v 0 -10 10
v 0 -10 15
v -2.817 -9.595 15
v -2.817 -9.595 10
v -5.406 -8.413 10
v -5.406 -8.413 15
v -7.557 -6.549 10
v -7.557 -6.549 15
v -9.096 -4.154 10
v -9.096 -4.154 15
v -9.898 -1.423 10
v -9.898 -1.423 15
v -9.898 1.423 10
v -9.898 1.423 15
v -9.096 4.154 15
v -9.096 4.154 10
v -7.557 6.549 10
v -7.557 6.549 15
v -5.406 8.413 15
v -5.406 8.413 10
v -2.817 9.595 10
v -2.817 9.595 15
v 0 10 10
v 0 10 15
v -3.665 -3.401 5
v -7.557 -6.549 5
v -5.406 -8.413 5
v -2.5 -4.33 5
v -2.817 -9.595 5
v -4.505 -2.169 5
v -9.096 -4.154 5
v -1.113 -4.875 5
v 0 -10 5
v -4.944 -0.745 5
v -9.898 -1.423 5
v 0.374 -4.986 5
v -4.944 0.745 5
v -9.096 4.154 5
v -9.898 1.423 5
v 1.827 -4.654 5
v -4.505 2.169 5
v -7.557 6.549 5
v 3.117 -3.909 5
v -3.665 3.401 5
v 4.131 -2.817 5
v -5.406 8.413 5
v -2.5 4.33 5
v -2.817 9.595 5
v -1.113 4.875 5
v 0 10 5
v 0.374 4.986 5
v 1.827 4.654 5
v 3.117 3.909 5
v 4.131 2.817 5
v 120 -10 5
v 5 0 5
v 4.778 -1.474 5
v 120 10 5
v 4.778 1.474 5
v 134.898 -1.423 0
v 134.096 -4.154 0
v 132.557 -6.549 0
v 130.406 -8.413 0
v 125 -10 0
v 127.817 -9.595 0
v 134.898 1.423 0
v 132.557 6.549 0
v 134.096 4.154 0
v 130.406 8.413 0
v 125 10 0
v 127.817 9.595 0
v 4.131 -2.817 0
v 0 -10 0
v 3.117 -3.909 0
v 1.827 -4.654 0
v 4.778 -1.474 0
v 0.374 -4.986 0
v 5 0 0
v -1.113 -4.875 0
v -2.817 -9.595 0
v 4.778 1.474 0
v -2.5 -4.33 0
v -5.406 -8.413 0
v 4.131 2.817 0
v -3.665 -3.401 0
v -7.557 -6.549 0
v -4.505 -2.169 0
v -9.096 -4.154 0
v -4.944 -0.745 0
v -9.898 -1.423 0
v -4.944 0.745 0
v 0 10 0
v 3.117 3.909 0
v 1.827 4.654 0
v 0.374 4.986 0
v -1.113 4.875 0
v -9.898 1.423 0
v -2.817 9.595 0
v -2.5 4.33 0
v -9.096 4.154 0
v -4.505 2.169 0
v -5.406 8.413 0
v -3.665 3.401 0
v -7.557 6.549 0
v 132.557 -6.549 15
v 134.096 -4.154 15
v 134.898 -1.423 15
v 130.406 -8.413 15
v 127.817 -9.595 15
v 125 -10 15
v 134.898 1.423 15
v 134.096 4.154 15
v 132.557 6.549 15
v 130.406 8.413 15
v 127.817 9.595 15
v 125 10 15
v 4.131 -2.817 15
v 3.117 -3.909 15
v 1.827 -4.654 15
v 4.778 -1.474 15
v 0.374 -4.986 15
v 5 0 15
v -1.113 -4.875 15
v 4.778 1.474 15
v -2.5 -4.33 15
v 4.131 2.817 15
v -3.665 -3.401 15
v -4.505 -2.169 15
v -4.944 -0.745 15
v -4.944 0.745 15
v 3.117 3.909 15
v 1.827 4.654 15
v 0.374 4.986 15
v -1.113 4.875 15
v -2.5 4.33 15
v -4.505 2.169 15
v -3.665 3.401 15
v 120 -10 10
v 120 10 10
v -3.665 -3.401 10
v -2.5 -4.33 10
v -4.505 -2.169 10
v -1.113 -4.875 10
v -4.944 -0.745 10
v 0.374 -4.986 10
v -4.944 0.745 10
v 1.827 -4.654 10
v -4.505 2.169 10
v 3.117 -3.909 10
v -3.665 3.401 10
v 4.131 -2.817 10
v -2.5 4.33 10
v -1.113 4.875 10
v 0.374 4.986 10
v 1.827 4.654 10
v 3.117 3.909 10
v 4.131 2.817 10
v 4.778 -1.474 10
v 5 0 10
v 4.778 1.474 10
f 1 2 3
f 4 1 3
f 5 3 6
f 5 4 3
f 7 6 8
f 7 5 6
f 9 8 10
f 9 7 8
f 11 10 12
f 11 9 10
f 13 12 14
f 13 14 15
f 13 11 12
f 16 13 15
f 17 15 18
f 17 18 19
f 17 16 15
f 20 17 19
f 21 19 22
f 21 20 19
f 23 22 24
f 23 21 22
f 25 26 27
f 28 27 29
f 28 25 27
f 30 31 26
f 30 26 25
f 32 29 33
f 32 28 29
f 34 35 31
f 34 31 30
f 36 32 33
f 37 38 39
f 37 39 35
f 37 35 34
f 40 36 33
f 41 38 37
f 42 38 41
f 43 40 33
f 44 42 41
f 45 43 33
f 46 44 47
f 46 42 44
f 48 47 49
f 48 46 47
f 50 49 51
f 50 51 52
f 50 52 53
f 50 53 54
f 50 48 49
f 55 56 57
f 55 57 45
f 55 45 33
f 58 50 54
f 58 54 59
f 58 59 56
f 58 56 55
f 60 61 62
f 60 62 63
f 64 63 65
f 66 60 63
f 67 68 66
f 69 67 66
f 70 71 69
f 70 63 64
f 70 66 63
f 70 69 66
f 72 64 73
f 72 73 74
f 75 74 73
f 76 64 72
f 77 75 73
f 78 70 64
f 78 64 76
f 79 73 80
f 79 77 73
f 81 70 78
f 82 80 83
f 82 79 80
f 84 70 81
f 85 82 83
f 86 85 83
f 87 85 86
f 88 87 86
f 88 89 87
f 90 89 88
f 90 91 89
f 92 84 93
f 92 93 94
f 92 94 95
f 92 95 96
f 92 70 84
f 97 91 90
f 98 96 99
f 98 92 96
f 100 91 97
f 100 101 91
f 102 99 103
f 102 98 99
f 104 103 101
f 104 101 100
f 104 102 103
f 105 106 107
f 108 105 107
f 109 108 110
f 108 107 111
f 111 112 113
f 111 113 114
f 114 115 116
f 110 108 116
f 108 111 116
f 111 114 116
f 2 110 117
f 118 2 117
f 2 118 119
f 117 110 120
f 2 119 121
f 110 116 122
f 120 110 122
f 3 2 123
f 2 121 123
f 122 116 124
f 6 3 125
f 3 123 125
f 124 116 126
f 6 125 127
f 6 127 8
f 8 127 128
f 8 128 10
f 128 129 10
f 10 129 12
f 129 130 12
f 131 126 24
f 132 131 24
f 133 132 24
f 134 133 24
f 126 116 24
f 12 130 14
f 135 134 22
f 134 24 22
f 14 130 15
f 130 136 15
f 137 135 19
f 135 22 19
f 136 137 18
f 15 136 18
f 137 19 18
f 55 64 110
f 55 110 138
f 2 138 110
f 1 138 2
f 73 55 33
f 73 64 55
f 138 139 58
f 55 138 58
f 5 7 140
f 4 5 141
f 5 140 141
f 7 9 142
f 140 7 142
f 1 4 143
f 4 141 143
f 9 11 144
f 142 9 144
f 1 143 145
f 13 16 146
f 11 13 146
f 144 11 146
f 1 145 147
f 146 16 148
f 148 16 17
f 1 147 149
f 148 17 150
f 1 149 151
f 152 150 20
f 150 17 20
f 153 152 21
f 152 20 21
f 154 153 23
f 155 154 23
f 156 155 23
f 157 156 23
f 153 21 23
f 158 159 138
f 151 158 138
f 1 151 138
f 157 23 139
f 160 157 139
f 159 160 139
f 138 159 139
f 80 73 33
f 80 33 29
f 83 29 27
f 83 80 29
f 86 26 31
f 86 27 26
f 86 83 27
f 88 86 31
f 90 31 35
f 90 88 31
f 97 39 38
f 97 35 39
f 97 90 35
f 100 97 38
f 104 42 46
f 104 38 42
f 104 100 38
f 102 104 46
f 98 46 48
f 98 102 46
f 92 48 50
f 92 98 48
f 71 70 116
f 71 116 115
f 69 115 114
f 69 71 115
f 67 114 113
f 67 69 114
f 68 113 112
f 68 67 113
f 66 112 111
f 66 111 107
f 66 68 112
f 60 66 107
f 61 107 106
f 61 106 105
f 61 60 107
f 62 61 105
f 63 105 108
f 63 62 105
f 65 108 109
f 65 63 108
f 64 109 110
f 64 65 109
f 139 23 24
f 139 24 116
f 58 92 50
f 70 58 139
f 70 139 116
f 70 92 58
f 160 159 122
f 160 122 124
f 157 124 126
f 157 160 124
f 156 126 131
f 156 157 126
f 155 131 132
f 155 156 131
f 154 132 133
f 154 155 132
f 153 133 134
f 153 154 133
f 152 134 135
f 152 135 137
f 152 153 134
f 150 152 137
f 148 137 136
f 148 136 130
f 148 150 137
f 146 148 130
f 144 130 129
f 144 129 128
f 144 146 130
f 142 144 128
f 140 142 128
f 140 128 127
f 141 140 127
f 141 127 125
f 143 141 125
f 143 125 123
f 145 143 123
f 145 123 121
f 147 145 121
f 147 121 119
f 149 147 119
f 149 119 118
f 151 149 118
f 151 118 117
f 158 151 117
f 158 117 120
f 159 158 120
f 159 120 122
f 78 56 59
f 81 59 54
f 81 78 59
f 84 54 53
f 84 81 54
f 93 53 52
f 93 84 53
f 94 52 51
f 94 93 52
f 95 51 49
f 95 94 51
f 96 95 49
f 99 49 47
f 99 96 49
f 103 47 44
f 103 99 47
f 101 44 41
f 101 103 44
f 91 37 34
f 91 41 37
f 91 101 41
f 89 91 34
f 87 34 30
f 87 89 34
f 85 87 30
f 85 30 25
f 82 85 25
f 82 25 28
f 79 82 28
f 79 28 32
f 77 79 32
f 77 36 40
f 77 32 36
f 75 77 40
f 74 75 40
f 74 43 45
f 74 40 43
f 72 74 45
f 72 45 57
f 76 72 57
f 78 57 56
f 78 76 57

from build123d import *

# Parameters (mm, degrees)
CROQUIS1_R              = 5
SALIENTE_EXTRUIR1_DEPTH = 15
CROQUIS2_W              = 130
CROQUIS2_H              = 5
CORTAR_EXTRUIR1_DEPTH   = 138.295302177


with BuildPart() as part:
    # Croquis1 → Saliente-Extruir1 (new body)
    with BuildSketch(Plane.XY):
        with BuildLine():
            Line((0, 10), (125, 10))
            ThreePointArc((125, 10), (135, 0), (125, -10))
            Line((125, -10), (0, -10))
            ThreePointArc((0, -10), (-10, 0), (0, 10))
        make_face()
        Circle(CROQUIS1_R, mode=Mode.SUBTRACT)
    extrude(amount=SALIENTE_EXTRUIR1_DEPTH)

    # Croquis2 → Cortar-Extruir1 (cut, through all)
    with BuildSketch(Plane(origin=(0, 10, 0), x_dir=(1, 0, 0), z_dir=(0, 1, 0))):
        with Locations((55, -7.5)):
            Rectangle(CROQUIS2_W, CROQUIS2_H)
    extrude(amount=-CORTAR_EXTRUIR1_DEPTH, mode=Mode.SUBTRACT)


solid = part.part
